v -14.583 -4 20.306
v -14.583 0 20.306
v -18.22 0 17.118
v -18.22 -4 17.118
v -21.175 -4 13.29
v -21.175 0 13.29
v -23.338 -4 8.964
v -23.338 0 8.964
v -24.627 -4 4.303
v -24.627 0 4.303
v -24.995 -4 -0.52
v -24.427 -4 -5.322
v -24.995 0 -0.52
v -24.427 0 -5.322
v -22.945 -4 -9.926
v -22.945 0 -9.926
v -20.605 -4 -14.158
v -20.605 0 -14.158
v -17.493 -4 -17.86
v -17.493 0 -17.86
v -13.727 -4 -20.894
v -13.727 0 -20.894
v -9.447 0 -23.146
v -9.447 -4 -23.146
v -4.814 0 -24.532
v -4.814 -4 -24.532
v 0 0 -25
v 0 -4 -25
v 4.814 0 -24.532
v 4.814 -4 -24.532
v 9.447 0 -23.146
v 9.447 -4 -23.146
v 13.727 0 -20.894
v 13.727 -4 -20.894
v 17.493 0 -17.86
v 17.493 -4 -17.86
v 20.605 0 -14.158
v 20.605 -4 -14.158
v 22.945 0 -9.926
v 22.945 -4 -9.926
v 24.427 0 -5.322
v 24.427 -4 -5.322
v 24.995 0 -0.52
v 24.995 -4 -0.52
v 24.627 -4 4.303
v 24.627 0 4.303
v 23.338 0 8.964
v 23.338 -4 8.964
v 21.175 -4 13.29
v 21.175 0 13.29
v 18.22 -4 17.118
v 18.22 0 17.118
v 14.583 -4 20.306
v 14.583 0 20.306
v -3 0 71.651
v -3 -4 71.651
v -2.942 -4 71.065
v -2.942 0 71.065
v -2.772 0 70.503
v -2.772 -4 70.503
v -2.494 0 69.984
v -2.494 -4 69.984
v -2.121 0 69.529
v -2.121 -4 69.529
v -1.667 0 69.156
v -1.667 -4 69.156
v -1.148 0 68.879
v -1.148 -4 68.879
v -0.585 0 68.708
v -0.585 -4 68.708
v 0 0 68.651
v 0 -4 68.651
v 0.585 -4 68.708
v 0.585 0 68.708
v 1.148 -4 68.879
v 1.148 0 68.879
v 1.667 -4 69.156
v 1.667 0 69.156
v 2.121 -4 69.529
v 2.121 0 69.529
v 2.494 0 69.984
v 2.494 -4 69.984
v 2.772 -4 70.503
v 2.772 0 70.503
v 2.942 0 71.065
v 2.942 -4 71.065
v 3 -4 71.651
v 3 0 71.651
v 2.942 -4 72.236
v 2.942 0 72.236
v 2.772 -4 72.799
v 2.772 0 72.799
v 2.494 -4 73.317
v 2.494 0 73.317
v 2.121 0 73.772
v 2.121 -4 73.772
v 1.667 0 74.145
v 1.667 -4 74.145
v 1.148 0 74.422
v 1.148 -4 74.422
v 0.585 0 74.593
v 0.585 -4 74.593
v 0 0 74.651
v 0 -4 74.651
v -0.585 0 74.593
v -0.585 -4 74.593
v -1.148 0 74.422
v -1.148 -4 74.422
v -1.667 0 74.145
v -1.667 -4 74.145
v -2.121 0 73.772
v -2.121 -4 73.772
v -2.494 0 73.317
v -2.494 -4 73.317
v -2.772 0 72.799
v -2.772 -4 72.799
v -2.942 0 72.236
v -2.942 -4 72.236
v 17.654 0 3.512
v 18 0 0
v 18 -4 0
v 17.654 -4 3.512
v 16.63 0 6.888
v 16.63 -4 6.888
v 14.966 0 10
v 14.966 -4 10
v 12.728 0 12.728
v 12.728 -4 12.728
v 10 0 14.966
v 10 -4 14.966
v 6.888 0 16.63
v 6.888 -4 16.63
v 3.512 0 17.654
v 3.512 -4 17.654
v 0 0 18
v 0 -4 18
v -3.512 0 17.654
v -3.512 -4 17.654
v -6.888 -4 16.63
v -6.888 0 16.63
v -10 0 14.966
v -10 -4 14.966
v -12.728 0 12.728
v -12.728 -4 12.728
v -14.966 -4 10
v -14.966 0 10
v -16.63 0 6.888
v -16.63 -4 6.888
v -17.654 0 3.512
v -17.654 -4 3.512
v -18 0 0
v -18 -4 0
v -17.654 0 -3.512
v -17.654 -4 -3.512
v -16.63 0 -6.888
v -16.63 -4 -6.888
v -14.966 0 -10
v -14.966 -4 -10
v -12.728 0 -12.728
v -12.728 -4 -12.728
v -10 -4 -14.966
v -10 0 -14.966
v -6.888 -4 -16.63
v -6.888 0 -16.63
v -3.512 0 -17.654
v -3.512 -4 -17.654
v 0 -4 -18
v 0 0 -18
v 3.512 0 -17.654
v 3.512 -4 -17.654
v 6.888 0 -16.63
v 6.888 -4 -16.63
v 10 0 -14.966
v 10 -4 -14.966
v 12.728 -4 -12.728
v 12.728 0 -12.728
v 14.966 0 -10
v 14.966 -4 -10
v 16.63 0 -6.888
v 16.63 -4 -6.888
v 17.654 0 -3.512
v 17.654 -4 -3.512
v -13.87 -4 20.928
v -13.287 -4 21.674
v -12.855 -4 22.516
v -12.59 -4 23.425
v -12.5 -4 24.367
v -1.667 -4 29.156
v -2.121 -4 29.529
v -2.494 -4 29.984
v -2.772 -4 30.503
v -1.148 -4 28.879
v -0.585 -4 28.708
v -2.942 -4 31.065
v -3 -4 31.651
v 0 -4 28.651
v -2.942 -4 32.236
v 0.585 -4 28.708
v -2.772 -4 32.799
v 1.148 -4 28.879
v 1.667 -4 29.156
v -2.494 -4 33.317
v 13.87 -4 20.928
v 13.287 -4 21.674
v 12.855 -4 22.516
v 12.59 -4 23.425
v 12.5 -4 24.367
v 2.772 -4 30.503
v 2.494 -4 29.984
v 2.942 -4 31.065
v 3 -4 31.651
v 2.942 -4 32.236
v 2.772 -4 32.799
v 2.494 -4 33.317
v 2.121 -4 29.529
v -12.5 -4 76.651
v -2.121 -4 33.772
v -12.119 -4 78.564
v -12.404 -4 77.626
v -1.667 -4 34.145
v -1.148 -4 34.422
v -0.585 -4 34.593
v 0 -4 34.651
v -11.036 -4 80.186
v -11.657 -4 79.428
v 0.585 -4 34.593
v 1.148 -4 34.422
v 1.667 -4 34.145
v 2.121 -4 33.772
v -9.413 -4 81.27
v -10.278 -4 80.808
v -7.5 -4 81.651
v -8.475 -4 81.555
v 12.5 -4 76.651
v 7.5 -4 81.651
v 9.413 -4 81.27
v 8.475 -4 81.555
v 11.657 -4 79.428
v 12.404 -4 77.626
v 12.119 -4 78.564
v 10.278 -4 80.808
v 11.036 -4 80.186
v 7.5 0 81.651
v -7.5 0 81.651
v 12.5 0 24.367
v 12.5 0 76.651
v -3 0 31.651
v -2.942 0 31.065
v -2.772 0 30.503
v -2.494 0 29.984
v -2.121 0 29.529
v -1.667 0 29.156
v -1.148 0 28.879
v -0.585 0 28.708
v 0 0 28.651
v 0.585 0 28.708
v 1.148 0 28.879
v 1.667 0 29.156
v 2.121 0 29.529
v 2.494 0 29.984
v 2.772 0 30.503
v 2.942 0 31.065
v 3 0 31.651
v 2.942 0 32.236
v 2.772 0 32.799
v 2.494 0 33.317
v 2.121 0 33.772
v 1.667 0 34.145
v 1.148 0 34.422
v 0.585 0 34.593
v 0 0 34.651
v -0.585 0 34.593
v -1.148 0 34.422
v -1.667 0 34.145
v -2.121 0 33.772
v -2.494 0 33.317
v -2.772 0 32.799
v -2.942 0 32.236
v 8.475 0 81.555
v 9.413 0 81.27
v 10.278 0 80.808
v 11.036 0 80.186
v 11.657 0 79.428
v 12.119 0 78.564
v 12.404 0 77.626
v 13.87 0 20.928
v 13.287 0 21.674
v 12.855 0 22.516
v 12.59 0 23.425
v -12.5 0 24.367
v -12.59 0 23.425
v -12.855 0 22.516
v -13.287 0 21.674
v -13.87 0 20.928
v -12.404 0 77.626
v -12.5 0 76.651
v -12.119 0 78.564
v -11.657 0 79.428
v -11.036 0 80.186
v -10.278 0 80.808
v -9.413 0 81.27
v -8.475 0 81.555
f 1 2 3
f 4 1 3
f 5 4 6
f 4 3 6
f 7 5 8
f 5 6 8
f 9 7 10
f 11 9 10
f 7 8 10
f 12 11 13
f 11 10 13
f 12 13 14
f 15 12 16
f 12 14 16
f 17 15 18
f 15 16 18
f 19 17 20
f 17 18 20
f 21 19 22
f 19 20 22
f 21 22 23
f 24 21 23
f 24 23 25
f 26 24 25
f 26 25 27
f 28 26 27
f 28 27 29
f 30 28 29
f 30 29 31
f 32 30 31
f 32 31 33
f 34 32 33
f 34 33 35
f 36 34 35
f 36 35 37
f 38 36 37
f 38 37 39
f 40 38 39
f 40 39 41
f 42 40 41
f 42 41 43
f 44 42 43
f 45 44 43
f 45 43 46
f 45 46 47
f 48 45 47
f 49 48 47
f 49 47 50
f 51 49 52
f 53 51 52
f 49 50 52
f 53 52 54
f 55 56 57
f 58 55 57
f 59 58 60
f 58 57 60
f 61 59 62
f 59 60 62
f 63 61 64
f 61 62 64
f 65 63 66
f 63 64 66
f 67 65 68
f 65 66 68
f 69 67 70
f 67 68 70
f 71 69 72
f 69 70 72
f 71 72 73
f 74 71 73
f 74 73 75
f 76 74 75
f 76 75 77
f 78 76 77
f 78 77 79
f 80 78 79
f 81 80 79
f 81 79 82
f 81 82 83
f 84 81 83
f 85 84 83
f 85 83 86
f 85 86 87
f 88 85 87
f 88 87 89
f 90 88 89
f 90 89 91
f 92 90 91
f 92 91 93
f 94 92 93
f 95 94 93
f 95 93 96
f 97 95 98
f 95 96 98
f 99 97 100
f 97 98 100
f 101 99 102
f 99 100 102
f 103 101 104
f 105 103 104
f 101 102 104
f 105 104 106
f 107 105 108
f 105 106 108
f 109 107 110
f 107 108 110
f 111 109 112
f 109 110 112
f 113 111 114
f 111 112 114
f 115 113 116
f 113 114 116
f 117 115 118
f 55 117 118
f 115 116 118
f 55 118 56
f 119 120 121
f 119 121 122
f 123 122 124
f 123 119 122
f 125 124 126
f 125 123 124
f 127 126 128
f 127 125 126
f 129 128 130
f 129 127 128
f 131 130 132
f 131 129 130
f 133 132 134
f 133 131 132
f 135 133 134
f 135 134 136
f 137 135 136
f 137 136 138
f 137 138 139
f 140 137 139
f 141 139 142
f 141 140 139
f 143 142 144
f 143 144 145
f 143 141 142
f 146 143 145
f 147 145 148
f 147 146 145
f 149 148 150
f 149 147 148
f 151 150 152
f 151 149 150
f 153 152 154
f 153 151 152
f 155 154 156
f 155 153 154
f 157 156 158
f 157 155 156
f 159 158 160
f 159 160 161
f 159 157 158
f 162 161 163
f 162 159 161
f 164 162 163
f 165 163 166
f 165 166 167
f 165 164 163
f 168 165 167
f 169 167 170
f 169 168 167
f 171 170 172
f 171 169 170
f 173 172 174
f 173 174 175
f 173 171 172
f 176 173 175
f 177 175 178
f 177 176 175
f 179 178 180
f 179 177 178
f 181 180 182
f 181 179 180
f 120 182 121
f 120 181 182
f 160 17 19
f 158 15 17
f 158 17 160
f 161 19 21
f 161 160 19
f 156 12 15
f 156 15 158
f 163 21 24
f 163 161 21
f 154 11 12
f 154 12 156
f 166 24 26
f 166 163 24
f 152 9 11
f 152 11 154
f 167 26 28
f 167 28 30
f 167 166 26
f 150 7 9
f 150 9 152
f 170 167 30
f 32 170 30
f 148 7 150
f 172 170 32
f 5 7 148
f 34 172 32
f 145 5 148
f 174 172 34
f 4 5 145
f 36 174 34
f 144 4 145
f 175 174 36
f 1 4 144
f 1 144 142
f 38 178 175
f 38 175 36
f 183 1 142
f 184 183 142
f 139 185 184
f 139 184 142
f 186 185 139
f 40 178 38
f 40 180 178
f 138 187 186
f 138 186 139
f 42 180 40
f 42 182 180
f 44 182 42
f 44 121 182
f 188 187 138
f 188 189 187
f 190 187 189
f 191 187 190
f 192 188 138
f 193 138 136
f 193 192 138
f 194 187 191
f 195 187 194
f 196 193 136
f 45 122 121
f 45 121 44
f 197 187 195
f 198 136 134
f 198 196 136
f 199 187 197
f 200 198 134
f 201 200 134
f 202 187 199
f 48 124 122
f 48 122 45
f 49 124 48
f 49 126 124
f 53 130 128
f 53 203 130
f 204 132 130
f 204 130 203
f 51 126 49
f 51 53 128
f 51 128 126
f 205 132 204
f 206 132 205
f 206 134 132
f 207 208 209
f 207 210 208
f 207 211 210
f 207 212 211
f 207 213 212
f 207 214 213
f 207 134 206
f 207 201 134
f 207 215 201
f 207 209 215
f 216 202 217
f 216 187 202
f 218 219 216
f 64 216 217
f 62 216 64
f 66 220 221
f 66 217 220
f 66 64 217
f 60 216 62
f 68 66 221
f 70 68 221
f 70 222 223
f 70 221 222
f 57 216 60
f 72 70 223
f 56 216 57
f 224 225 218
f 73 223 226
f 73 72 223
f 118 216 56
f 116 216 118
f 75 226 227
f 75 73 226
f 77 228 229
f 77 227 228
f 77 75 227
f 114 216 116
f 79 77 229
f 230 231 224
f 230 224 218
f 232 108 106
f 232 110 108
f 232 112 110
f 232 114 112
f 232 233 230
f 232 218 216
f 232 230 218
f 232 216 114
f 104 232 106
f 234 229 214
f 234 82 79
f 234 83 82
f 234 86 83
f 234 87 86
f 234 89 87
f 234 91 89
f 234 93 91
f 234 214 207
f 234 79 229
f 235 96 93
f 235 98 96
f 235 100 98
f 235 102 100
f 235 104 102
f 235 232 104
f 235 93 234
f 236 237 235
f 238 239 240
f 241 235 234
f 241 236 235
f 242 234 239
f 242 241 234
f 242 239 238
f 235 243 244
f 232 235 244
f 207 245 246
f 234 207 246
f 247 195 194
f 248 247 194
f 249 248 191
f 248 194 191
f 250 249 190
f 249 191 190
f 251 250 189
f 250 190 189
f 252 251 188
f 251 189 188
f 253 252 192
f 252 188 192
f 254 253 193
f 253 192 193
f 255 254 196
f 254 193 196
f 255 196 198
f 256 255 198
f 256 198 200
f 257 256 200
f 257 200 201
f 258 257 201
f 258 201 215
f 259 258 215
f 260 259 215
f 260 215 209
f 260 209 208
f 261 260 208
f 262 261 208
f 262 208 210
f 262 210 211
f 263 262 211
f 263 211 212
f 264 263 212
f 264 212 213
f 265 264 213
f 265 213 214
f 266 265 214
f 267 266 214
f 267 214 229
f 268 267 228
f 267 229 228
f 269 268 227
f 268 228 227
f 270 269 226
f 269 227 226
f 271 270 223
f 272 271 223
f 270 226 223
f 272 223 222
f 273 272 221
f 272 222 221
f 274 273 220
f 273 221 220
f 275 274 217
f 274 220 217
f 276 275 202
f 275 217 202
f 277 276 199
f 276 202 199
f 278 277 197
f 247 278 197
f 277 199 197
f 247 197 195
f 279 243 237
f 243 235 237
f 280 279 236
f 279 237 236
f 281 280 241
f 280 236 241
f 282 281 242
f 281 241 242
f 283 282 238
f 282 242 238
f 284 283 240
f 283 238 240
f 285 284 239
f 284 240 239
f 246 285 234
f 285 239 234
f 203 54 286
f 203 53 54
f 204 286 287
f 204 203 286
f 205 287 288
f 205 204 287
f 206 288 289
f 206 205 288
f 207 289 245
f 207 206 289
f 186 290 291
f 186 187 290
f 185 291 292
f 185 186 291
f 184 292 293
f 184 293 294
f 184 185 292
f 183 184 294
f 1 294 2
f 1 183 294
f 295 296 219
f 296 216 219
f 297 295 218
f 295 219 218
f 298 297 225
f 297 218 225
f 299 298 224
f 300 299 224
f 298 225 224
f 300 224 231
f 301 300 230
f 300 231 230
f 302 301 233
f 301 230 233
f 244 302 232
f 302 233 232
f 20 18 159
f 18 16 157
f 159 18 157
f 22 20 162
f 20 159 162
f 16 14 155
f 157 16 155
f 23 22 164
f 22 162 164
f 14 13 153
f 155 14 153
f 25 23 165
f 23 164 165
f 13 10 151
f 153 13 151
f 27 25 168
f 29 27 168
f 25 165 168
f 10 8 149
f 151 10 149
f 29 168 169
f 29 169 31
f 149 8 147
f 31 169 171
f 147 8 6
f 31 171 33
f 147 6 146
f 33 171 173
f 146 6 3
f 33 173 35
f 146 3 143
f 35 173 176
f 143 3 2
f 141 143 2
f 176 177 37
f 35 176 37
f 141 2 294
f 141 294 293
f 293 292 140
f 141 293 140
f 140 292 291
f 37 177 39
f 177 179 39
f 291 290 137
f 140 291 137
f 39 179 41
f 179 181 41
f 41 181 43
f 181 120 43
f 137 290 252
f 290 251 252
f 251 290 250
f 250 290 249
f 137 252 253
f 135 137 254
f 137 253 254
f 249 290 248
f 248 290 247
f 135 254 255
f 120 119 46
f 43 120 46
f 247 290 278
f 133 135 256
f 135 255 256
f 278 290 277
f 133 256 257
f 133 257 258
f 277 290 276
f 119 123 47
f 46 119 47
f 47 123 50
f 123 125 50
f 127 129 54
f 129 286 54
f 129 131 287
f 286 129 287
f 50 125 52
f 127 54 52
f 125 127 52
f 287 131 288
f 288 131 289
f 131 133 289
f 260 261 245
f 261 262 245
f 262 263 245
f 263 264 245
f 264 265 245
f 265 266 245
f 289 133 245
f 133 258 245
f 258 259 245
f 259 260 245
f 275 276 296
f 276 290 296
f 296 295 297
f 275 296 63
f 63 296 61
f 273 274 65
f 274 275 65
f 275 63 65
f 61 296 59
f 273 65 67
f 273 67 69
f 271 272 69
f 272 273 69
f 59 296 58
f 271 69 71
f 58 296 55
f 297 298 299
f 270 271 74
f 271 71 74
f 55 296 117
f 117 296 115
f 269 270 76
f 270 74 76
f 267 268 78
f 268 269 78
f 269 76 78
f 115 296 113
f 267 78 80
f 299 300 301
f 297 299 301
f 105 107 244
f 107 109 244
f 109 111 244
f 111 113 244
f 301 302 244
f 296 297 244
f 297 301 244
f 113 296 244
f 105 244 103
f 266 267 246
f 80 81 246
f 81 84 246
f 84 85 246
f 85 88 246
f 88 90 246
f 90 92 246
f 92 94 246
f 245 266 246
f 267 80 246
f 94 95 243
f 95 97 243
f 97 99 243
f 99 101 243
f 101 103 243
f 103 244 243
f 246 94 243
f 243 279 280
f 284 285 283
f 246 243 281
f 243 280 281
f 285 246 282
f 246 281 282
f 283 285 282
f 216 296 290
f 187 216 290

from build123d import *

# Parameters (mm, degrees)
F0_R     = 18
F1_DEPTH = 4
F2_R     = 5
F3_D     = 6


with BuildPart() as f1:
    # F0 (on Front) → F1 (new body)
    with BuildSketch(Plane.XZ):
        with BuildLine():
            Line((-12.5, 81.6506350946), (-12.5, 21.6506350946))
            ThreePointArc((-12.5, 21.6506350946), (0, -25), (12.5, 21.6506350946))
            Line((12.5, 21.6506350946), (12.5, 81.6506350946))
            Line((12.5, 81.6506350946), (-12.5, 81.6506350946))
        make_face()
        Circle(F0_R, mode=Mode.SUBTRACT)
    extrude(amount=F1_DEPTH)

    # F2
    f2_edges = [f1.edges().sort_by_distance(p)[0] for p in [
        (12.5, -2, 81.650635),
        (12.5, -2, 21.650635),
        (-12.5, -2, 21.650635),
        (-12.5, -2, 81.650635),
    ]]
    fillet(f2_edges, radius=F2_R)

    # F3 (through all)
    with Locations(Plane(origin=(0, 0, 0), x_dir=(1, 0, 0), z_dir=(0, 1, 0))):
        with Locations((0, -31.6506350946), (0, -71.6506350946)):
            Hole(F3_D / 2)


solid = f1.part
